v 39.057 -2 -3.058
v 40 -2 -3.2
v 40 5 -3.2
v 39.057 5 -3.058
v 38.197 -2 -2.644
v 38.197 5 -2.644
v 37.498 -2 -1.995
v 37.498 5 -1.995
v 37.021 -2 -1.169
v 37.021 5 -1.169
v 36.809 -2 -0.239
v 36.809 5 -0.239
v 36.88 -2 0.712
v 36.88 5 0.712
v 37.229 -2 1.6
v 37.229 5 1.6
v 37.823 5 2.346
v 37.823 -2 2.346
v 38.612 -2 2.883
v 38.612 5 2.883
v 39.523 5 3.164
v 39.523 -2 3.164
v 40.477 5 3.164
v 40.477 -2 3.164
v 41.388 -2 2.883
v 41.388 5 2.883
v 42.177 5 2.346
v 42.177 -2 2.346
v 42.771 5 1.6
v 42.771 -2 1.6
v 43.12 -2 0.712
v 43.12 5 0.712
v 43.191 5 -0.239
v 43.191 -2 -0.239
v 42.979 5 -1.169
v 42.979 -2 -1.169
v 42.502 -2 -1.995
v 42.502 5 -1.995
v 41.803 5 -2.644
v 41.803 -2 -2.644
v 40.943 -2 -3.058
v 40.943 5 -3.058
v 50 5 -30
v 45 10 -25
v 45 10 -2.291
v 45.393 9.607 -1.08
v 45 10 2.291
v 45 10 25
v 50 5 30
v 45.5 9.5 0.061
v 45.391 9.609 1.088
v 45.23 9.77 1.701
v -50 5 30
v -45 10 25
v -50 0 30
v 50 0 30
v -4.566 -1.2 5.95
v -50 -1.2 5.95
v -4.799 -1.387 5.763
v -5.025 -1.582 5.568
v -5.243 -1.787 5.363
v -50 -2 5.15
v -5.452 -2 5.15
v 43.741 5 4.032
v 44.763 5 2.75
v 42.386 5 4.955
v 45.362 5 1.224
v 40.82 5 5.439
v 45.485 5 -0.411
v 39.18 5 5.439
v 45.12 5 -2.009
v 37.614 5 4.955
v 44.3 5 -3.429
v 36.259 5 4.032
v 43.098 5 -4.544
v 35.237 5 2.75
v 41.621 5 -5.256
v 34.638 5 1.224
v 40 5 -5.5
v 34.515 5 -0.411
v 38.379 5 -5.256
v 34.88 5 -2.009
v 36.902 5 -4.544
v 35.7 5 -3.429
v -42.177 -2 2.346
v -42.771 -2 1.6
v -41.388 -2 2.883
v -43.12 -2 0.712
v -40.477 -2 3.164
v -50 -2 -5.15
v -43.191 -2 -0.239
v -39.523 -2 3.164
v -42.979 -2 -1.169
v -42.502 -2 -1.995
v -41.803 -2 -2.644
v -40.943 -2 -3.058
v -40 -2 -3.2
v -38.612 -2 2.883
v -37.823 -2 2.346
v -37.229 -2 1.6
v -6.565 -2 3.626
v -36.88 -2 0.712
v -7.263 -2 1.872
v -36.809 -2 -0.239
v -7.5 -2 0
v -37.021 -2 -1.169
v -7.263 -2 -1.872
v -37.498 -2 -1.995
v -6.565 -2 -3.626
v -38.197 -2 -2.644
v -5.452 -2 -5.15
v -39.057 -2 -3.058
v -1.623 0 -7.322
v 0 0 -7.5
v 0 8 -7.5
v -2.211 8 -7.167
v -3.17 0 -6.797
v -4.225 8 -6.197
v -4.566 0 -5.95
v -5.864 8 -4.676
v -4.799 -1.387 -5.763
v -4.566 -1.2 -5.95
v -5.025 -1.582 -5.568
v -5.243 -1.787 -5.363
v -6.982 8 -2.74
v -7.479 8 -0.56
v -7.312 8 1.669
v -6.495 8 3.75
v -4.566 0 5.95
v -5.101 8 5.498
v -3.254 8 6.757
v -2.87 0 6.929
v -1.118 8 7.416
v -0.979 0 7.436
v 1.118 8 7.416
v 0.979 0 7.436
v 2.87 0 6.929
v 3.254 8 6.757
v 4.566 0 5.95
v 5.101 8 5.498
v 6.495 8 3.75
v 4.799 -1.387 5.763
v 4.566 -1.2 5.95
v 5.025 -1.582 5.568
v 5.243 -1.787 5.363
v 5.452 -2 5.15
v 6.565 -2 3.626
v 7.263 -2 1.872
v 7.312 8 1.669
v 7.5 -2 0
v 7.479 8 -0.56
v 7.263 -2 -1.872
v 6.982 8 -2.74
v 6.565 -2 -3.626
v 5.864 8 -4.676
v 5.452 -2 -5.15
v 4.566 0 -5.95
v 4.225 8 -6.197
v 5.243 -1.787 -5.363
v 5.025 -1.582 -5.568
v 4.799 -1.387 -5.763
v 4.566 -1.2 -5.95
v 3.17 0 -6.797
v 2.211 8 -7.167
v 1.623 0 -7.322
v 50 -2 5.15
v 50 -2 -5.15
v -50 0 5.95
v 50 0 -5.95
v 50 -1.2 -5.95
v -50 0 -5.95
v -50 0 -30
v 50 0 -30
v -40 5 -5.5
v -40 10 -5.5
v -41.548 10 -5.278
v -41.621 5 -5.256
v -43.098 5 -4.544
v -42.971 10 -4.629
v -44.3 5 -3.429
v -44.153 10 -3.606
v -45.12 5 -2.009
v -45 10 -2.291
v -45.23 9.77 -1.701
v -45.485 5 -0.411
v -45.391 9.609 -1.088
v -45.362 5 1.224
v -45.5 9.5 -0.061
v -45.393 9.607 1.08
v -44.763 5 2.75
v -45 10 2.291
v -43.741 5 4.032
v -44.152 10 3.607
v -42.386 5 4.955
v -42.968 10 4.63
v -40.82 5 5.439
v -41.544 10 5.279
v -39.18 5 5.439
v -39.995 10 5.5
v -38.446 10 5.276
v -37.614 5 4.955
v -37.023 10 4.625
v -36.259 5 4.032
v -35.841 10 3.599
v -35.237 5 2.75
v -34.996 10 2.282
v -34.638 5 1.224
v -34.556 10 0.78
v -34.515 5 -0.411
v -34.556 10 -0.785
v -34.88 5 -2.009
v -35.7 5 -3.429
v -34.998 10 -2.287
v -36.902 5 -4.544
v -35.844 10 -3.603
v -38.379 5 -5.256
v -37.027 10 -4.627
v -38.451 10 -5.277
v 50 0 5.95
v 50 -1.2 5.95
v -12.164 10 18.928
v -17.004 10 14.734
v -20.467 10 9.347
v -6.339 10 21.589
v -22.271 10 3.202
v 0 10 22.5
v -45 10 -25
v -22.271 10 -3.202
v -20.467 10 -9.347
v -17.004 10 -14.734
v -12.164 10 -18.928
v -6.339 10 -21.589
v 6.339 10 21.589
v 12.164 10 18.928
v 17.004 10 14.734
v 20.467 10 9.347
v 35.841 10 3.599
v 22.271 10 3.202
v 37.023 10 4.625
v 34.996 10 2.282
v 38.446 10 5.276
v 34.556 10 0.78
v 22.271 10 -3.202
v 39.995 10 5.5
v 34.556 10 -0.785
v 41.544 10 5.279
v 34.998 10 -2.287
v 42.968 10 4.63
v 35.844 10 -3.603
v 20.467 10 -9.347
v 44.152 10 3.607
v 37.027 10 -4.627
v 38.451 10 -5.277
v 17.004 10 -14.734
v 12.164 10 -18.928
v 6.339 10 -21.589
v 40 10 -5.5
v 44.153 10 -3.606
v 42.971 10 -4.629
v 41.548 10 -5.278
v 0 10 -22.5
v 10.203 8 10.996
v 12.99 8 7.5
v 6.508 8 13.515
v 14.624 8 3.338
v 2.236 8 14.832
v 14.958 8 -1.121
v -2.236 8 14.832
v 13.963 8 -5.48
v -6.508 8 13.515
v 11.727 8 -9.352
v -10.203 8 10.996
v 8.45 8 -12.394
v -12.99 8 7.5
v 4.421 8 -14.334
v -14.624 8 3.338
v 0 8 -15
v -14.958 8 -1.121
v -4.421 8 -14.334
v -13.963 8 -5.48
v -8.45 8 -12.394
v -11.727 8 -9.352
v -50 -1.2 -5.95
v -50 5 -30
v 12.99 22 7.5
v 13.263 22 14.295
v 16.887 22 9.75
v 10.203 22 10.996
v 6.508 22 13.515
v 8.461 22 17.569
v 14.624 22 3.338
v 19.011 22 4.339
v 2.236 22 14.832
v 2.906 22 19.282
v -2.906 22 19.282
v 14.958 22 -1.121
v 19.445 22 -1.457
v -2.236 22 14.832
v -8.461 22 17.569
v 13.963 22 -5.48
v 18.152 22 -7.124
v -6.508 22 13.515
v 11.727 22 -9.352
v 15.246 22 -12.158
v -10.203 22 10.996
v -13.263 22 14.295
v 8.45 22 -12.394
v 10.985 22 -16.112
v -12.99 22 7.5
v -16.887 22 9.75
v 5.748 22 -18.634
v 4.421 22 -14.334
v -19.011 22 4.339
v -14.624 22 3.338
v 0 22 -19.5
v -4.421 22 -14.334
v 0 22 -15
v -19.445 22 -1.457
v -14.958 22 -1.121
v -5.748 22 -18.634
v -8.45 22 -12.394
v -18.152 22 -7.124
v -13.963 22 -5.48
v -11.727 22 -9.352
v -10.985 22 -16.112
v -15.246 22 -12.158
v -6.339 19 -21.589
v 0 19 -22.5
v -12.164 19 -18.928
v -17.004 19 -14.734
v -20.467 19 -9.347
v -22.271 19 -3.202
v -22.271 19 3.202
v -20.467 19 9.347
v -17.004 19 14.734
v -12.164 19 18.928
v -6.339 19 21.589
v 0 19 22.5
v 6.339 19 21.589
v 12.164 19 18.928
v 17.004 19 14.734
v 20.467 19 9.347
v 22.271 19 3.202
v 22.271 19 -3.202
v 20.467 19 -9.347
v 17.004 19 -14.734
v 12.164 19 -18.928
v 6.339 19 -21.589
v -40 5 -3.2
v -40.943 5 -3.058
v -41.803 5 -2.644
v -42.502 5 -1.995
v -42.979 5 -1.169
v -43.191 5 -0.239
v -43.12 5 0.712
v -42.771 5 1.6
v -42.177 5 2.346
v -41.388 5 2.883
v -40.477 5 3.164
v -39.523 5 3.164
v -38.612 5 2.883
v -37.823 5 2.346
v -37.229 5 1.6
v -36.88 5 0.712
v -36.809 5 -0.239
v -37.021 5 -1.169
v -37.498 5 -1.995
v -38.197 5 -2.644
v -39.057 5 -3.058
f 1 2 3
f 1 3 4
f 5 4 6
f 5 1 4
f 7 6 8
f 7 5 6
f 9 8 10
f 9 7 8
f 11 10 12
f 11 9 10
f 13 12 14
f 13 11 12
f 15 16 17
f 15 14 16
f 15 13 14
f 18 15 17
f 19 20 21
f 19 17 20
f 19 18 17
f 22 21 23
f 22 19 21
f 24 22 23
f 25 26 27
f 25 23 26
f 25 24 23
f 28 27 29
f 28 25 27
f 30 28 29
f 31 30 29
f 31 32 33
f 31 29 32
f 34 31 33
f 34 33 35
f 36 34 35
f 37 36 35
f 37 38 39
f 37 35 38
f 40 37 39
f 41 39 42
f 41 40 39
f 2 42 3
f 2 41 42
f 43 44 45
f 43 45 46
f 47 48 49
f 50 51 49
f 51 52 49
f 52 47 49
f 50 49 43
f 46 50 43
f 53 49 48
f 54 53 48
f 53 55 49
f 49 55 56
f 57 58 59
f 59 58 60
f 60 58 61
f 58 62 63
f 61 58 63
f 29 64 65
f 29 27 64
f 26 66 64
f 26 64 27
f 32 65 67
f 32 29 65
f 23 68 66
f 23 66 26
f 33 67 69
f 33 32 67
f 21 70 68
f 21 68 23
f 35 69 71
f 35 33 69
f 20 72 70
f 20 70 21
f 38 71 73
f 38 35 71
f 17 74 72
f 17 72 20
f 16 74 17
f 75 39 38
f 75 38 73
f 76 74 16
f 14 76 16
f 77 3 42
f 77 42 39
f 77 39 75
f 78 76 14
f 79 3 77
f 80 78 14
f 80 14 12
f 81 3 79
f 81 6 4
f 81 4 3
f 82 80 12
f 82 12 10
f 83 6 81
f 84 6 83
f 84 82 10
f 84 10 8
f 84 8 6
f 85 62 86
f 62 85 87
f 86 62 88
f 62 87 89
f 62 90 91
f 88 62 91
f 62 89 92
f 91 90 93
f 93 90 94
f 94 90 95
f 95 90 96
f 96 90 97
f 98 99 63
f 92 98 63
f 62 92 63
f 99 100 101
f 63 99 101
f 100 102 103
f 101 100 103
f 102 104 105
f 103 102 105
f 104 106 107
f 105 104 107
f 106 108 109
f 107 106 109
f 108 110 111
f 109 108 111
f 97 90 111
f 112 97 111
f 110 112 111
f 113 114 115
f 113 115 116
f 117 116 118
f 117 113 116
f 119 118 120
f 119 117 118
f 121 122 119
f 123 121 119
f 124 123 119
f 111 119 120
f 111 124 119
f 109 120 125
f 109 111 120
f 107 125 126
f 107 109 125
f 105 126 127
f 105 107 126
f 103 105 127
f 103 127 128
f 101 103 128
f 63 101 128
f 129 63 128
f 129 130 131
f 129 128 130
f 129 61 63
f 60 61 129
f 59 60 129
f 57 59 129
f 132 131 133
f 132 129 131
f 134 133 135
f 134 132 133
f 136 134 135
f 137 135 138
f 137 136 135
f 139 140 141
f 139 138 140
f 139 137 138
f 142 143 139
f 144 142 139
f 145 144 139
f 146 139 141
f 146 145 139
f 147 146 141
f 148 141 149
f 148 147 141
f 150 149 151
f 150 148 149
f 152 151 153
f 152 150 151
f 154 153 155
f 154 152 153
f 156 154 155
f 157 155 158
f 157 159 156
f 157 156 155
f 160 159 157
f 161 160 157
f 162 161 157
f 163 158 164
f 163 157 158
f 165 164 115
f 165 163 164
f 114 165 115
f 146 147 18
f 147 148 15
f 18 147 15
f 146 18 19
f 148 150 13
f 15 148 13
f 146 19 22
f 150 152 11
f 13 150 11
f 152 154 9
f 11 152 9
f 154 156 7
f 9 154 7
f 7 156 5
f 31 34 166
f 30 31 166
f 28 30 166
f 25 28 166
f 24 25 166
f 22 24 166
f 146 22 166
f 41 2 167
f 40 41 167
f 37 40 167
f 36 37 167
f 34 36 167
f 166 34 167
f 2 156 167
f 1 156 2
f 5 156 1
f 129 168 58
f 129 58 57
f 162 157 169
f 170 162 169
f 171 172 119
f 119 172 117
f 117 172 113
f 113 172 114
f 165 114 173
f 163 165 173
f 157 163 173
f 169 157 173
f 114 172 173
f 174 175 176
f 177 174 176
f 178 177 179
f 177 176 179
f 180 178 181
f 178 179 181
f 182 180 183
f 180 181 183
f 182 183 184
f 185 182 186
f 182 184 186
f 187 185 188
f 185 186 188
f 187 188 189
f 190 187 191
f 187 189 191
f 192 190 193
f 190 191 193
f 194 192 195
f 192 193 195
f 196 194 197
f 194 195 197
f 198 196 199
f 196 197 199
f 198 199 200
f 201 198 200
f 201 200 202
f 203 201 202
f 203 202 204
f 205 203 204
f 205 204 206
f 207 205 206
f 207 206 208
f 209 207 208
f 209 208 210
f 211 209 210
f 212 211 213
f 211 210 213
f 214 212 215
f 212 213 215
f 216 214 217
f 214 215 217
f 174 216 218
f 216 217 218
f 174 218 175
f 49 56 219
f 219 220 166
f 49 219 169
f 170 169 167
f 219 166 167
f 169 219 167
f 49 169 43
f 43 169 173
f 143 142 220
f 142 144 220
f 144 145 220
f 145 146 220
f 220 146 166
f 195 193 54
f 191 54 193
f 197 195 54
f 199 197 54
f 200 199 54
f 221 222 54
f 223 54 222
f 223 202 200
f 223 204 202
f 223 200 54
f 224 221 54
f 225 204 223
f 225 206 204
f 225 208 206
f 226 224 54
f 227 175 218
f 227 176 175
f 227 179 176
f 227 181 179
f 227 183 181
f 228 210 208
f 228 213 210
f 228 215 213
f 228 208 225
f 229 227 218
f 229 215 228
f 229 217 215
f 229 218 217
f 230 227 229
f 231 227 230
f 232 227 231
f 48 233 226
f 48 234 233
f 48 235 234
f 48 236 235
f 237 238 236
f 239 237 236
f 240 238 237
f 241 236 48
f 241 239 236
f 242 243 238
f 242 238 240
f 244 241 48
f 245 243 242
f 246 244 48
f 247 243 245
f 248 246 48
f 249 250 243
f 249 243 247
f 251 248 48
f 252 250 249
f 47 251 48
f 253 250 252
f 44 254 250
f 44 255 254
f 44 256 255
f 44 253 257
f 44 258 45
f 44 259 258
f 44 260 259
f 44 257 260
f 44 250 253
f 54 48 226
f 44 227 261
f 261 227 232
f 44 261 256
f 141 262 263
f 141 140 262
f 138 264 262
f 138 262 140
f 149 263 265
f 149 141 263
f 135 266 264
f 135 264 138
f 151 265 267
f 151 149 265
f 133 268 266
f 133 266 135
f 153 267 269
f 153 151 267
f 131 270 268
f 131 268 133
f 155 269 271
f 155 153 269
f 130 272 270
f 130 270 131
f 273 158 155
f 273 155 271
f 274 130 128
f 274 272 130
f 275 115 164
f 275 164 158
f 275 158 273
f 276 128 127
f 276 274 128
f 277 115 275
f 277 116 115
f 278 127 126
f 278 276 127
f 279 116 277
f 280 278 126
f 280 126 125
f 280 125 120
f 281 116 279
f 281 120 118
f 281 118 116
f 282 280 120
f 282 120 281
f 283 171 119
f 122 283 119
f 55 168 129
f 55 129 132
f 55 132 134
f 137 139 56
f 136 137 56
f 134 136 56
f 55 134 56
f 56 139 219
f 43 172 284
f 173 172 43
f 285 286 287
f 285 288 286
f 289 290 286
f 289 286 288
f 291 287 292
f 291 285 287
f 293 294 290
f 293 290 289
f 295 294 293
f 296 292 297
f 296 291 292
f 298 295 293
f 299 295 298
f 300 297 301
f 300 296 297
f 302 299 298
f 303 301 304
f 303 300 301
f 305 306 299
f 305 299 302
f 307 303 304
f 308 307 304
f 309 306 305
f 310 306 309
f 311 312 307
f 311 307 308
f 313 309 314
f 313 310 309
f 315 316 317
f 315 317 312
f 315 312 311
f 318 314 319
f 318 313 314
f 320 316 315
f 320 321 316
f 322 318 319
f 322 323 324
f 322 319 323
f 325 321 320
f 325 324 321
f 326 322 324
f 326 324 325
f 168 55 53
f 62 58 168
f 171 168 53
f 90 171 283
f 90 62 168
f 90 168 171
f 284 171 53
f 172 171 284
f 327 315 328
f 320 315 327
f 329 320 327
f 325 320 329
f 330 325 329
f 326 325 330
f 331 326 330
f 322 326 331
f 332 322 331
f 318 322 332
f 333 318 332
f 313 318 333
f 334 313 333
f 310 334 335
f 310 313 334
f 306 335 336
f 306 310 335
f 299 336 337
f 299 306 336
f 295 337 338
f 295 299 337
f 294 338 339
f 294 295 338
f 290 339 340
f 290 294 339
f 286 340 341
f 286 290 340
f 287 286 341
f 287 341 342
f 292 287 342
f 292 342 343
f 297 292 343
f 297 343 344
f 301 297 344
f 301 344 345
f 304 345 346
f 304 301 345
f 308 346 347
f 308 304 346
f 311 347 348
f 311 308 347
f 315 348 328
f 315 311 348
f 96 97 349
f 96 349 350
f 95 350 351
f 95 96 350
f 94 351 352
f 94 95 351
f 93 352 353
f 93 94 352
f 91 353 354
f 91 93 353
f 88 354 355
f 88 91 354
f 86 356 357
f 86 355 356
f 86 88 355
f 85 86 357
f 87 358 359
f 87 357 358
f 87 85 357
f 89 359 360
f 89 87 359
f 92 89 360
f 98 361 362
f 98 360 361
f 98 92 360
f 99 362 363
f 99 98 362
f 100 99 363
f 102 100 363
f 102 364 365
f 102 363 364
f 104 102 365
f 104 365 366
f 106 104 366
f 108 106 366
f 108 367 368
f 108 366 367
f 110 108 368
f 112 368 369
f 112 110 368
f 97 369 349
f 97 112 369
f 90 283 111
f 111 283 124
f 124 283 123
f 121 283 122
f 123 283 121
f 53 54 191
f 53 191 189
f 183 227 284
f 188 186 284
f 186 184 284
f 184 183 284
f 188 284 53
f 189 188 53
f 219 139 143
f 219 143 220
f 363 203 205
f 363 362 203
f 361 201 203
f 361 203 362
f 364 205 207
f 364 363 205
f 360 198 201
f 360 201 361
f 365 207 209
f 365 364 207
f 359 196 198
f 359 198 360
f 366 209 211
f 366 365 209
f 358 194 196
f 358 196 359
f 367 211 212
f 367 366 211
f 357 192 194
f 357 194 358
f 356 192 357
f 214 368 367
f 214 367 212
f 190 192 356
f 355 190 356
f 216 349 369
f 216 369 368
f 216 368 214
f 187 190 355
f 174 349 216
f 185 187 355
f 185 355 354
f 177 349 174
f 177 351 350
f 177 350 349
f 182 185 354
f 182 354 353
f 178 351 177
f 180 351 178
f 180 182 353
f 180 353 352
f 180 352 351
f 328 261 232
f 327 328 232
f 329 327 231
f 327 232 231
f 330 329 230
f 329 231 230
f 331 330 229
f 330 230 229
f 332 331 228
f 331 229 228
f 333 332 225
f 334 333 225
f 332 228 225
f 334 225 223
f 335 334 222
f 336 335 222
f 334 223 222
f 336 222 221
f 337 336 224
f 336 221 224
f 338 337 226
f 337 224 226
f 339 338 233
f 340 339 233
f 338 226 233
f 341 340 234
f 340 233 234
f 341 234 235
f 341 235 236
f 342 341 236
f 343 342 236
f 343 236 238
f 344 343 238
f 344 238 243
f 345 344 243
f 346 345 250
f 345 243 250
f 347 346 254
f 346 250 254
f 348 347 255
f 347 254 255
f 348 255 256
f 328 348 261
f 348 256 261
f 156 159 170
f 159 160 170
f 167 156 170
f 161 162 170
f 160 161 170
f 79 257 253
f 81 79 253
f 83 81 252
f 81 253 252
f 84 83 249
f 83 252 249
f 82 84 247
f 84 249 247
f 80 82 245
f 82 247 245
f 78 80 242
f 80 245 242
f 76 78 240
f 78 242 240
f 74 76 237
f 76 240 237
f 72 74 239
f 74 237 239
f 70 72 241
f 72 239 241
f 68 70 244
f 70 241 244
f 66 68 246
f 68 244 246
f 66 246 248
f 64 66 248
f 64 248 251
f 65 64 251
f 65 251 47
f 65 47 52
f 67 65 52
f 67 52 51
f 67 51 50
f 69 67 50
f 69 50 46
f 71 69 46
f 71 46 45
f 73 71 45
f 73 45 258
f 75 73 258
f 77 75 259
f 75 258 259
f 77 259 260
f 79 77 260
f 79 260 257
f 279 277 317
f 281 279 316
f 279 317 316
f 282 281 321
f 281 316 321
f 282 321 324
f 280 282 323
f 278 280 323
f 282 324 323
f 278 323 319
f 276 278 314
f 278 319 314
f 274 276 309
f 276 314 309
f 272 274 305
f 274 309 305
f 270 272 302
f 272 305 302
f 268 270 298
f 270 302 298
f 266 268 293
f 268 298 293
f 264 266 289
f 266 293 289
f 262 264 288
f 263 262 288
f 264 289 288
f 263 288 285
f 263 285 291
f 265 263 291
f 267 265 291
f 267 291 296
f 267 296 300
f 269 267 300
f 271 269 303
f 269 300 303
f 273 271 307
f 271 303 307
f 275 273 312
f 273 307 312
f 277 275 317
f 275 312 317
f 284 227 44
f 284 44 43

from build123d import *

# Parameters (mm, degrees)
SKETCH1_W               = 100
SKETCH1_H               = 60
BOSS_EXTRUDE1_DEPTH     = 10
BOSS_EXTRUDE2_START     = 10
SKETCH3_R               = 22.5
BOSS_EXTRUDE2_DEPTH     = 12
CUT_EXTRUDE2_START      = 22
SKETCH4_R               = 15
CUT_EXTRUDE2_DEPTH      = 14
SKETCH6_W               = 100
SKETCH6_H               = 11.9
BOSS_EXTRUDE3_DEPTH     = 2
CUT_EXTRUDE1_DEPTH      = 63.321745804
CUT_EXTRUDE1_DEPTH_BACK = 63.321745804
SKETCH2_R               = 3.2
CUT_EXTRUDE3_DEPTH      = 63.321745804
CUT_EXTRUDE3_DEPTH_BACK = 63.321745804
SKETCH5_R               = 7.5
CUT_EXTRUDE4_START      = 10
SKETCH8_R               = 5.5
CUT_EXTRUDE4_DEPTH      = 5
CHAMFER1_SIZE           = 5
CHAMFER2_SIZE           = 3
CHAMFER3_SIZE           = 0.8


with BuildPart() as part:
    # Sketch1 → Boss-Extrude1 (new body)
    with BuildSketch(Plane(origin=(0, 0, 0), x_dir=(1, 0, 0), z_dir=(0, 1, 0))):
        Rectangle(SKETCH1_W, SKETCH1_H)
    extrude(amount=BOSS_EXTRUDE1_DEPTH)

    # Sketch3 → Boss-Extrude2 (add)
    with BuildSketch(Plane(origin=(0, 0, 0), x_dir=(1, 0, 0), z_dir=(0, 1, 0)).offset(BOSS_EXTRUDE2_START)):
        with Locations(Location((0, 0, 0), (0, 0, 90))):
            Circle(SKETCH3_R)
    extrude(amount=BOSS_EXTRUDE2_DEPTH)

    # Sketch4 → Cut-Extrude2 (cut)
    with BuildSketch(Plane(origin=(0, 0, 0), x_dir=(1, 0, 0), z_dir=(0, 1, 0)).offset(CUT_EXTRUDE2_START)):
        with Locations(Location((0, 0, 0), (0, 0, 90))):
            Circle(SKETCH4_R)
    extrude(amount=-CUT_EXTRUDE2_DEPTH, mode=Mode.SUBTRACT)

    # Sketch6 → Boss-Extrude3 (add)
    with BuildSketch(Plane(origin=(0, 0, 0), x_dir=(1, 0, 0), z_dir=(0, 1, 0))):
        Rectangle(SKETCH6_W, SKETCH6_H)
    extrude(amount=-BOSS_EXTRUDE3_DEPTH)

    # Sketch2 → Cut-Extrude1 (cut, two sides: drawn at the far end of the back side and taken through both)
    with BuildSketch(Plane(origin=(0, 0, 0), x_dir=(1, 0, 0), z_dir=(0, 1, 0)).offset(-CUT_EXTRUDE1_DEPTH_BACK)):
        with Locations(Location((-40, 0, 0), (0, 0, 90))):
            Circle(SKETCH2_R)
        with Locations(Location((40, 0, 0), (0, 0, 90))):
            Circle(SKETCH2_R)
    extrude(amount=CUT_EXTRUDE1_DEPTH + CUT_EXTRUDE1_DEPTH_BACK, mode=Mode.SUBTRACT)

    # Sketch5 → Cut-Extrude3 (cut, two sides: drawn at the far end of the back side and taken through both)
    with BuildSketch(Plane(origin=(0, 0, 0), x_dir=(1, 0, 0), z_dir=(0, 1, 0)).offset(-CUT_EXTRUDE3_DEPTH_BACK)):
        with Locations(Location((0, 0, 0), (0, 0, 90))):
            Circle(SKETCH5_R)
    extrude(amount=CUT_EXTRUDE3_DEPTH + CUT_EXTRUDE3_DEPTH_BACK, mode=Mode.SUBTRACT)

    # Sketch8 → Cut-Extrude4 (cut)
    with BuildSketch(Plane(origin=(0, 0, 0), x_dir=(1, 0, 0), z_dir=(0, 1, 0)).offset(CUT_EXTRUDE4_START)):
        with Locations(Location((40, 0, 0), (0, 0, 90))):
            Circle(SKETCH8_R)
        with Locations(Location((-40, 0, 0), (0, 0, 90))):
            Circle(SKETCH8_R)
    extrude(amount=-CUT_EXTRUDE4_DEPTH, mode=Mode.SUBTRACT)

    # Chamfer1
    # the kernel refuses this chamfer: 5 mm, written as the material it takes off along each edge
    with BuildSketch(Plane(origin=(-50, 10, -42.85841494), x_dir=(0.9996219169112968, 0.027495876610586317, 0), z_dir=(0, 0, 1)), Plane(origin=(50, 10, 42.85841494), x_dir=(-0.9996219169112968, 0.027495876610586317, 0), z_dir=(0, 0, -1))) as chamfer1_piece_1:
        Polygon((CHAMFER1_SIZE * 0.999621916911, -CHAMFER1_SIZE * 0.0274958766106), (-CHAMFER1_SIZE * 0.0274958766106, -CHAMFER1_SIZE * 0.999621916911), (0, 0), align=None)
    extrude(amount=85.71682988, mode=Mode.SUBTRACT)
    with BuildSketch(Plane(origin=(-62.85841494, 10, 30), x_dir=(0, -0.9996219169112968, 0.027495876610586317), z_dir=(1, 0, 0))) as chamfer1_piece_2:
        Polygon((CHAMFER1_SIZE * 0.999621916911, CHAMFER1_SIZE * 0.0274958766106), (-CHAMFER1_SIZE * 0.0274958766106, CHAMFER1_SIZE * 0.999621916911), (0, 0), align=None)
    extrude(amount=125.71682988, mode=Mode.SUBTRACT)
    with BuildSketch(Plane(origin=(62.85841494, 10, -30), x_dir=(0, 0.027495876610586317, 0.9996219169112968), z_dir=(-1, 0, 0))) as chamfer1_piece_3:
        Polygon((CHAMFER1_SIZE * 0.999621916911, -CHAMFER1_SIZE * 0.0274958766106), (-CHAMFER1_SIZE * 0.0274958766106, -CHAMFER1_SIZE * 0.999621916911), (0, 0), align=None)
    extrude(amount=125.71682988, mode=Mode.SUBTRACT)

    # Chamfer2
    chamfer2_edges = [part.edges().sort_by_distance(p)[0] for p in [
        (0, 22, 22.5),
    ]]
    chamfer(chamfer2_edges, length=CHAMFER2_SIZE)

    # Chamfer3
    chamfer3_edges = [part.edges().sort_by_distance(p)[0] for p in [
        (27.282953131, -2, -5.95),
        (-27.282953131, -2, 5.95),
        (-27.282953131, -2, -5.95),
        (27.282953131, -2, 5.95),
    ]]
    chamfer(chamfer3_edges, length=CHAMFER3_SIZE)


solid = part.part
